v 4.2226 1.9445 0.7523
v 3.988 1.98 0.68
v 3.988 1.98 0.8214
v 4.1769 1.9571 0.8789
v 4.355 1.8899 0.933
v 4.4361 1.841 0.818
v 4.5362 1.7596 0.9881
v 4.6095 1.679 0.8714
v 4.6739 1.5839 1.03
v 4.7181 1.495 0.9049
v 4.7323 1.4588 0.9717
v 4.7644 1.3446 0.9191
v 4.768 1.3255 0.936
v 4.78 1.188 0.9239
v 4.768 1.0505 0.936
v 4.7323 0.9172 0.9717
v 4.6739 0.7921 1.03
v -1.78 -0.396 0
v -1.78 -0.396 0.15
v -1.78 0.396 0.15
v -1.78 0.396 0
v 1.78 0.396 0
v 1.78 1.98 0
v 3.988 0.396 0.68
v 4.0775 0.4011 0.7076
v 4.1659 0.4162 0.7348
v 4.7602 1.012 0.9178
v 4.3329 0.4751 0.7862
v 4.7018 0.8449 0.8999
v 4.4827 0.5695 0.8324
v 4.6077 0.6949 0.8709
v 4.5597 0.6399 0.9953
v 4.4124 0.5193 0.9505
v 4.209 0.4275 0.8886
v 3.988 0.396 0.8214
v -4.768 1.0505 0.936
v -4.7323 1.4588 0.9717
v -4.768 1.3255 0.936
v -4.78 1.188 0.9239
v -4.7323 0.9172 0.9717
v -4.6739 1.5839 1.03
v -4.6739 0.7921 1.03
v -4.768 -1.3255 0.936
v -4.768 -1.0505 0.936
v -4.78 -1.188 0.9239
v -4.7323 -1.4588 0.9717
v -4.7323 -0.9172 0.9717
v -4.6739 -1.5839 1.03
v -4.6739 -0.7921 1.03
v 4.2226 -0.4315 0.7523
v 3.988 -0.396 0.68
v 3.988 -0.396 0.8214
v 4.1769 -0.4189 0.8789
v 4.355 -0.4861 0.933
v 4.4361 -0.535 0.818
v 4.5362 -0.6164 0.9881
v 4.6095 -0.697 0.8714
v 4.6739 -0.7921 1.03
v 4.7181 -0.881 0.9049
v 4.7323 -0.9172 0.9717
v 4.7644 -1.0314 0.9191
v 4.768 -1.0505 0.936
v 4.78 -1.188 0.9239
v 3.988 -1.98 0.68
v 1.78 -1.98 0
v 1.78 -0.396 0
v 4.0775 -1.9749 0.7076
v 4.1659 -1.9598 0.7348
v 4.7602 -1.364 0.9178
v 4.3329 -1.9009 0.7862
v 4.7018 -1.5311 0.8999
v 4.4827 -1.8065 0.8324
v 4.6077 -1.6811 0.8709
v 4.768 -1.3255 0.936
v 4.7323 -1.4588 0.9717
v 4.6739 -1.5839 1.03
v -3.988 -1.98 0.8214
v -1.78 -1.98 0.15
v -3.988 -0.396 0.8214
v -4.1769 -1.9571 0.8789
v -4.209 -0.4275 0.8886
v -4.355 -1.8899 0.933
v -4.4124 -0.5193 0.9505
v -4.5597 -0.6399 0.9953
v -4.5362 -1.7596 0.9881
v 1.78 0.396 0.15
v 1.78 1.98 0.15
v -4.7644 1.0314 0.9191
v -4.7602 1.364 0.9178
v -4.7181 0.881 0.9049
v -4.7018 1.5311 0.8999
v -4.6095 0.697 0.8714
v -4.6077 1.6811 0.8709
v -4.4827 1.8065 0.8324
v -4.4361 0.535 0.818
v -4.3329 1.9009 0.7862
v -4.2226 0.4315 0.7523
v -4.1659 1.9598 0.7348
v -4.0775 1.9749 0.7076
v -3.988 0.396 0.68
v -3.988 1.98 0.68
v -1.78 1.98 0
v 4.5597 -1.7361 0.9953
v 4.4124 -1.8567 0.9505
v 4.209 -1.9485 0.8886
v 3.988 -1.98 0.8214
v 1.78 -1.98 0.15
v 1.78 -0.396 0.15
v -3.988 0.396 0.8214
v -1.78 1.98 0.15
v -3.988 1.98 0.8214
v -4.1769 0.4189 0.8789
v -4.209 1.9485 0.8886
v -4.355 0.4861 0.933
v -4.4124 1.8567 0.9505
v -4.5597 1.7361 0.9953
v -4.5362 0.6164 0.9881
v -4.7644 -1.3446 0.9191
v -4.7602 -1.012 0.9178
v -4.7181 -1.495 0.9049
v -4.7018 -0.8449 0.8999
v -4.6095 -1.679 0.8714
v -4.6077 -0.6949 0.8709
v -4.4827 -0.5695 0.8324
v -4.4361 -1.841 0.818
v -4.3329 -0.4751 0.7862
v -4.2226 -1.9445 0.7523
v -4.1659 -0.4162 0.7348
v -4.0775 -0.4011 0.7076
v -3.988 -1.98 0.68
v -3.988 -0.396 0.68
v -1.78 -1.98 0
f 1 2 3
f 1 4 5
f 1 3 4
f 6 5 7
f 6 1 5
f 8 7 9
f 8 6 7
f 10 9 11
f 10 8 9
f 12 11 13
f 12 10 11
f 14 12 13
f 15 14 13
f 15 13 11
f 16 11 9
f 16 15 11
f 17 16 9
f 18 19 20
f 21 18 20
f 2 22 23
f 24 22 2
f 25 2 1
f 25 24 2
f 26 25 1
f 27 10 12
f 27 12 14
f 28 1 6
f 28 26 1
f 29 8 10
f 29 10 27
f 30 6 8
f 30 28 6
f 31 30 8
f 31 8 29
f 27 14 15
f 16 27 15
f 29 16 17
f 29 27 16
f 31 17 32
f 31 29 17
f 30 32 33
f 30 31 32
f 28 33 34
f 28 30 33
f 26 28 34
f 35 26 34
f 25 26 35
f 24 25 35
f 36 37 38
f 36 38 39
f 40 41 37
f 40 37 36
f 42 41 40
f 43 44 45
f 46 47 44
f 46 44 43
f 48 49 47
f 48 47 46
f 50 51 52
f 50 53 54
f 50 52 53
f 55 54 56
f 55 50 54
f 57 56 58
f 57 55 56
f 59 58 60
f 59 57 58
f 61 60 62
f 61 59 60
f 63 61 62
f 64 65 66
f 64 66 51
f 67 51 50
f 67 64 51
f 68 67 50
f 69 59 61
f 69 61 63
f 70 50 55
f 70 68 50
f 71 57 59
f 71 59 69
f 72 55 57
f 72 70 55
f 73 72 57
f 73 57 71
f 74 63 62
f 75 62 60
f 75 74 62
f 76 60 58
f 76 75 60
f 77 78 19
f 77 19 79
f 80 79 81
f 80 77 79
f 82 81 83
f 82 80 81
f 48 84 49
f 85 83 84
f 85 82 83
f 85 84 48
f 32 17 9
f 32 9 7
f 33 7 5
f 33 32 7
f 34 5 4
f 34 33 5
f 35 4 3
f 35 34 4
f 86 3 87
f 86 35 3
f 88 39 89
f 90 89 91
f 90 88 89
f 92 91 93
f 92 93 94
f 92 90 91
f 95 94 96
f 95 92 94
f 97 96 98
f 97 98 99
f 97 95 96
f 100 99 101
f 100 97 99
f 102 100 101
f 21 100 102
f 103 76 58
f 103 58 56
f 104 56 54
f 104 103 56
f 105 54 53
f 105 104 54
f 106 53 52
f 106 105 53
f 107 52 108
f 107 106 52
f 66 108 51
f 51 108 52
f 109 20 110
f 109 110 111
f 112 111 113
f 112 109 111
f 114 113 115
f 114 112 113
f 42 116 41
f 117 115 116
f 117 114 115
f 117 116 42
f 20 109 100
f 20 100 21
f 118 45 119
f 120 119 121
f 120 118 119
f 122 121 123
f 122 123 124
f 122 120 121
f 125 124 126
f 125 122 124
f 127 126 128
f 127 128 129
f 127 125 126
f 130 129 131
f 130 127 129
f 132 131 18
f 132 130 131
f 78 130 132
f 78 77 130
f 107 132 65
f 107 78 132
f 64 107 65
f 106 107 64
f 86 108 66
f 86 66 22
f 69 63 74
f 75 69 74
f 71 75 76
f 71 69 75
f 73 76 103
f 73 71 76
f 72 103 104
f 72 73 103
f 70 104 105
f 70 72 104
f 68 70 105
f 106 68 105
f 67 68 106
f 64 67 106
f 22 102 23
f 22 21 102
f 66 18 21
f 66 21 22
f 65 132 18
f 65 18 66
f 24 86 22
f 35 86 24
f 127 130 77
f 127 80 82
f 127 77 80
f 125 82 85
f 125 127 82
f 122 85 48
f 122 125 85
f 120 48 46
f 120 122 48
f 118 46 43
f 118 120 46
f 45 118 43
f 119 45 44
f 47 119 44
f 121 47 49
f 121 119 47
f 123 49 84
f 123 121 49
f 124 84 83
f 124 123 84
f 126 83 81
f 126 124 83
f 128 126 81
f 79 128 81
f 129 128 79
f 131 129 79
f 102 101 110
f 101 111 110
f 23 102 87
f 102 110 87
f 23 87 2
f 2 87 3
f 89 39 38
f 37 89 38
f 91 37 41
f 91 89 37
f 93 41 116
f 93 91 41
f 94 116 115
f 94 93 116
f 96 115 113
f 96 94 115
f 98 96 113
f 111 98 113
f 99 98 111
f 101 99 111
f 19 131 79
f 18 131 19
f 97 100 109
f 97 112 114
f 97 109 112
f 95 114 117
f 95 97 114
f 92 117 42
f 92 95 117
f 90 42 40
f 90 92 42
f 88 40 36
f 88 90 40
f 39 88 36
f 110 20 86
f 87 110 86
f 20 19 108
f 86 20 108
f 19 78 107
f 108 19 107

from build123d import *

# Parameters (mm, degrees)
F0_W          = 3.56
F0_H          = 0.15
F1_DEPTH      = 1.98
F1_DEPTH_BACK = 1.98
F3_DEPTH      = 25
F4_W          = 1.269972
F4_H          = 0.792
F5_DEPTH      = 25


with BuildPart() as f1:
    # F0 (on Front) → F1 (new body, two sides)
    with BuildSketch(Plane.XZ) as f1_sk:
        with Locations((0, 0.075)):
            Rectangle(F0_W, F0_H)
        Polygon((-4.78, 0.923934), (-1.78, 0), (-1.78, 0.15), (-4.673934, 1.03), align=None)
        Polygon((1.78, 0.15), (1.78, 0), (4.78, 0.923934), (4.673934, 1.03), align=None)
    extrude(amount=F1_DEPTH)
    extrude(f1_sk.sketch, amount=-F1_DEPTH_BACK)

    # F2 (on face) → F3 (cut)
    with BuildSketch(Plane.XY.offset(0.15)):
        with BuildLine():
            ThreePointArc((-4.78, 1.188), (-4.548029, 1.748029), (-3.988, 1.98))
            Line((-3.988, 1.98), (-3.981051, 2.372488))
            Line((-3.981051, 2.372488), (-5.453913, 2.372488))
            Line((-5.453913, 2.372488), (-5.453913, -2.307775))
            Line((-5.453913, -2.307775), (-3.988, -2.307775))
            Line((-3.988, -2.307775), (-3.988, -1.98))
            ThreePointArc((-3.988, -1.98), (-4.548029, -1.748029), (-4.78, -1.188))
            ThreePointArc((-4.78, -1.188), (-4.548029, -0.627972), (-3.988, -0.396))
            Line((-3.988, -0.396), (-1.78, -0.396))
            Line((-1.78, -0.396), (-1.78, 0))
            Line((-1.78, 0), (-1.78, 0.396))
            Line((-1.78, 0.396), (-3.988, 0.396))
            ThreePointArc((-3.988, 0.396), (-4.548029, 0.627972), (-4.78, 1.188))
        make_face()
        with BuildLine():
            ThreePointArc((3.988, -0.396), (4.548029, -0.627972), (4.78, -1.188))
            ThreePointArc((4.78, -1.188), (4.548029, -1.748029), (3.988, -1.98))
            Line((3.988, -1.98), (3.988, -2.307775))
            Line((3.988, -2.307775), (5.453913, -2.307775))
            Line((5.453913, -2.307775), (5.453913, 2.372488))
            Line((5.453913, 2.372488), (3.981051, 2.372488))
            Line((3.981051, 2.372488), (3.988, 1.98))
            ThreePointArc((3.988, 1.98), (4.548029, 1.748029), (4.78, 1.188))
            ThreePointArc((4.78, 1.188), (4.548029, 0.627972), (3.988, 0.396))
            Line((3.988, 0.396), (1.78, 0.396))
            Line((1.78, 0.396), (1.78, 0))
            Line((1.78, 0), (1.78, -0.396))
            Line((1.78, -0.396), (3.988, -0.396))
        make_face()
    extrude(amount=F3_DEPTH, mode=Mode.SUBTRACT)

    # F4 (on face) → F5 (cut)
    with BuildSketch(Plane.XY.offset(0.15)):
        with Locations((-2.414986, 0)):
            Rectangle(F4_W, F4_H)
        with Locations((2.414986, 0)):
            Rectangle(F4_W, F4_H)
    extrude(amount=-F5_DEPTH, mode=Mode.SUBTRACT)


solid = f1.part
